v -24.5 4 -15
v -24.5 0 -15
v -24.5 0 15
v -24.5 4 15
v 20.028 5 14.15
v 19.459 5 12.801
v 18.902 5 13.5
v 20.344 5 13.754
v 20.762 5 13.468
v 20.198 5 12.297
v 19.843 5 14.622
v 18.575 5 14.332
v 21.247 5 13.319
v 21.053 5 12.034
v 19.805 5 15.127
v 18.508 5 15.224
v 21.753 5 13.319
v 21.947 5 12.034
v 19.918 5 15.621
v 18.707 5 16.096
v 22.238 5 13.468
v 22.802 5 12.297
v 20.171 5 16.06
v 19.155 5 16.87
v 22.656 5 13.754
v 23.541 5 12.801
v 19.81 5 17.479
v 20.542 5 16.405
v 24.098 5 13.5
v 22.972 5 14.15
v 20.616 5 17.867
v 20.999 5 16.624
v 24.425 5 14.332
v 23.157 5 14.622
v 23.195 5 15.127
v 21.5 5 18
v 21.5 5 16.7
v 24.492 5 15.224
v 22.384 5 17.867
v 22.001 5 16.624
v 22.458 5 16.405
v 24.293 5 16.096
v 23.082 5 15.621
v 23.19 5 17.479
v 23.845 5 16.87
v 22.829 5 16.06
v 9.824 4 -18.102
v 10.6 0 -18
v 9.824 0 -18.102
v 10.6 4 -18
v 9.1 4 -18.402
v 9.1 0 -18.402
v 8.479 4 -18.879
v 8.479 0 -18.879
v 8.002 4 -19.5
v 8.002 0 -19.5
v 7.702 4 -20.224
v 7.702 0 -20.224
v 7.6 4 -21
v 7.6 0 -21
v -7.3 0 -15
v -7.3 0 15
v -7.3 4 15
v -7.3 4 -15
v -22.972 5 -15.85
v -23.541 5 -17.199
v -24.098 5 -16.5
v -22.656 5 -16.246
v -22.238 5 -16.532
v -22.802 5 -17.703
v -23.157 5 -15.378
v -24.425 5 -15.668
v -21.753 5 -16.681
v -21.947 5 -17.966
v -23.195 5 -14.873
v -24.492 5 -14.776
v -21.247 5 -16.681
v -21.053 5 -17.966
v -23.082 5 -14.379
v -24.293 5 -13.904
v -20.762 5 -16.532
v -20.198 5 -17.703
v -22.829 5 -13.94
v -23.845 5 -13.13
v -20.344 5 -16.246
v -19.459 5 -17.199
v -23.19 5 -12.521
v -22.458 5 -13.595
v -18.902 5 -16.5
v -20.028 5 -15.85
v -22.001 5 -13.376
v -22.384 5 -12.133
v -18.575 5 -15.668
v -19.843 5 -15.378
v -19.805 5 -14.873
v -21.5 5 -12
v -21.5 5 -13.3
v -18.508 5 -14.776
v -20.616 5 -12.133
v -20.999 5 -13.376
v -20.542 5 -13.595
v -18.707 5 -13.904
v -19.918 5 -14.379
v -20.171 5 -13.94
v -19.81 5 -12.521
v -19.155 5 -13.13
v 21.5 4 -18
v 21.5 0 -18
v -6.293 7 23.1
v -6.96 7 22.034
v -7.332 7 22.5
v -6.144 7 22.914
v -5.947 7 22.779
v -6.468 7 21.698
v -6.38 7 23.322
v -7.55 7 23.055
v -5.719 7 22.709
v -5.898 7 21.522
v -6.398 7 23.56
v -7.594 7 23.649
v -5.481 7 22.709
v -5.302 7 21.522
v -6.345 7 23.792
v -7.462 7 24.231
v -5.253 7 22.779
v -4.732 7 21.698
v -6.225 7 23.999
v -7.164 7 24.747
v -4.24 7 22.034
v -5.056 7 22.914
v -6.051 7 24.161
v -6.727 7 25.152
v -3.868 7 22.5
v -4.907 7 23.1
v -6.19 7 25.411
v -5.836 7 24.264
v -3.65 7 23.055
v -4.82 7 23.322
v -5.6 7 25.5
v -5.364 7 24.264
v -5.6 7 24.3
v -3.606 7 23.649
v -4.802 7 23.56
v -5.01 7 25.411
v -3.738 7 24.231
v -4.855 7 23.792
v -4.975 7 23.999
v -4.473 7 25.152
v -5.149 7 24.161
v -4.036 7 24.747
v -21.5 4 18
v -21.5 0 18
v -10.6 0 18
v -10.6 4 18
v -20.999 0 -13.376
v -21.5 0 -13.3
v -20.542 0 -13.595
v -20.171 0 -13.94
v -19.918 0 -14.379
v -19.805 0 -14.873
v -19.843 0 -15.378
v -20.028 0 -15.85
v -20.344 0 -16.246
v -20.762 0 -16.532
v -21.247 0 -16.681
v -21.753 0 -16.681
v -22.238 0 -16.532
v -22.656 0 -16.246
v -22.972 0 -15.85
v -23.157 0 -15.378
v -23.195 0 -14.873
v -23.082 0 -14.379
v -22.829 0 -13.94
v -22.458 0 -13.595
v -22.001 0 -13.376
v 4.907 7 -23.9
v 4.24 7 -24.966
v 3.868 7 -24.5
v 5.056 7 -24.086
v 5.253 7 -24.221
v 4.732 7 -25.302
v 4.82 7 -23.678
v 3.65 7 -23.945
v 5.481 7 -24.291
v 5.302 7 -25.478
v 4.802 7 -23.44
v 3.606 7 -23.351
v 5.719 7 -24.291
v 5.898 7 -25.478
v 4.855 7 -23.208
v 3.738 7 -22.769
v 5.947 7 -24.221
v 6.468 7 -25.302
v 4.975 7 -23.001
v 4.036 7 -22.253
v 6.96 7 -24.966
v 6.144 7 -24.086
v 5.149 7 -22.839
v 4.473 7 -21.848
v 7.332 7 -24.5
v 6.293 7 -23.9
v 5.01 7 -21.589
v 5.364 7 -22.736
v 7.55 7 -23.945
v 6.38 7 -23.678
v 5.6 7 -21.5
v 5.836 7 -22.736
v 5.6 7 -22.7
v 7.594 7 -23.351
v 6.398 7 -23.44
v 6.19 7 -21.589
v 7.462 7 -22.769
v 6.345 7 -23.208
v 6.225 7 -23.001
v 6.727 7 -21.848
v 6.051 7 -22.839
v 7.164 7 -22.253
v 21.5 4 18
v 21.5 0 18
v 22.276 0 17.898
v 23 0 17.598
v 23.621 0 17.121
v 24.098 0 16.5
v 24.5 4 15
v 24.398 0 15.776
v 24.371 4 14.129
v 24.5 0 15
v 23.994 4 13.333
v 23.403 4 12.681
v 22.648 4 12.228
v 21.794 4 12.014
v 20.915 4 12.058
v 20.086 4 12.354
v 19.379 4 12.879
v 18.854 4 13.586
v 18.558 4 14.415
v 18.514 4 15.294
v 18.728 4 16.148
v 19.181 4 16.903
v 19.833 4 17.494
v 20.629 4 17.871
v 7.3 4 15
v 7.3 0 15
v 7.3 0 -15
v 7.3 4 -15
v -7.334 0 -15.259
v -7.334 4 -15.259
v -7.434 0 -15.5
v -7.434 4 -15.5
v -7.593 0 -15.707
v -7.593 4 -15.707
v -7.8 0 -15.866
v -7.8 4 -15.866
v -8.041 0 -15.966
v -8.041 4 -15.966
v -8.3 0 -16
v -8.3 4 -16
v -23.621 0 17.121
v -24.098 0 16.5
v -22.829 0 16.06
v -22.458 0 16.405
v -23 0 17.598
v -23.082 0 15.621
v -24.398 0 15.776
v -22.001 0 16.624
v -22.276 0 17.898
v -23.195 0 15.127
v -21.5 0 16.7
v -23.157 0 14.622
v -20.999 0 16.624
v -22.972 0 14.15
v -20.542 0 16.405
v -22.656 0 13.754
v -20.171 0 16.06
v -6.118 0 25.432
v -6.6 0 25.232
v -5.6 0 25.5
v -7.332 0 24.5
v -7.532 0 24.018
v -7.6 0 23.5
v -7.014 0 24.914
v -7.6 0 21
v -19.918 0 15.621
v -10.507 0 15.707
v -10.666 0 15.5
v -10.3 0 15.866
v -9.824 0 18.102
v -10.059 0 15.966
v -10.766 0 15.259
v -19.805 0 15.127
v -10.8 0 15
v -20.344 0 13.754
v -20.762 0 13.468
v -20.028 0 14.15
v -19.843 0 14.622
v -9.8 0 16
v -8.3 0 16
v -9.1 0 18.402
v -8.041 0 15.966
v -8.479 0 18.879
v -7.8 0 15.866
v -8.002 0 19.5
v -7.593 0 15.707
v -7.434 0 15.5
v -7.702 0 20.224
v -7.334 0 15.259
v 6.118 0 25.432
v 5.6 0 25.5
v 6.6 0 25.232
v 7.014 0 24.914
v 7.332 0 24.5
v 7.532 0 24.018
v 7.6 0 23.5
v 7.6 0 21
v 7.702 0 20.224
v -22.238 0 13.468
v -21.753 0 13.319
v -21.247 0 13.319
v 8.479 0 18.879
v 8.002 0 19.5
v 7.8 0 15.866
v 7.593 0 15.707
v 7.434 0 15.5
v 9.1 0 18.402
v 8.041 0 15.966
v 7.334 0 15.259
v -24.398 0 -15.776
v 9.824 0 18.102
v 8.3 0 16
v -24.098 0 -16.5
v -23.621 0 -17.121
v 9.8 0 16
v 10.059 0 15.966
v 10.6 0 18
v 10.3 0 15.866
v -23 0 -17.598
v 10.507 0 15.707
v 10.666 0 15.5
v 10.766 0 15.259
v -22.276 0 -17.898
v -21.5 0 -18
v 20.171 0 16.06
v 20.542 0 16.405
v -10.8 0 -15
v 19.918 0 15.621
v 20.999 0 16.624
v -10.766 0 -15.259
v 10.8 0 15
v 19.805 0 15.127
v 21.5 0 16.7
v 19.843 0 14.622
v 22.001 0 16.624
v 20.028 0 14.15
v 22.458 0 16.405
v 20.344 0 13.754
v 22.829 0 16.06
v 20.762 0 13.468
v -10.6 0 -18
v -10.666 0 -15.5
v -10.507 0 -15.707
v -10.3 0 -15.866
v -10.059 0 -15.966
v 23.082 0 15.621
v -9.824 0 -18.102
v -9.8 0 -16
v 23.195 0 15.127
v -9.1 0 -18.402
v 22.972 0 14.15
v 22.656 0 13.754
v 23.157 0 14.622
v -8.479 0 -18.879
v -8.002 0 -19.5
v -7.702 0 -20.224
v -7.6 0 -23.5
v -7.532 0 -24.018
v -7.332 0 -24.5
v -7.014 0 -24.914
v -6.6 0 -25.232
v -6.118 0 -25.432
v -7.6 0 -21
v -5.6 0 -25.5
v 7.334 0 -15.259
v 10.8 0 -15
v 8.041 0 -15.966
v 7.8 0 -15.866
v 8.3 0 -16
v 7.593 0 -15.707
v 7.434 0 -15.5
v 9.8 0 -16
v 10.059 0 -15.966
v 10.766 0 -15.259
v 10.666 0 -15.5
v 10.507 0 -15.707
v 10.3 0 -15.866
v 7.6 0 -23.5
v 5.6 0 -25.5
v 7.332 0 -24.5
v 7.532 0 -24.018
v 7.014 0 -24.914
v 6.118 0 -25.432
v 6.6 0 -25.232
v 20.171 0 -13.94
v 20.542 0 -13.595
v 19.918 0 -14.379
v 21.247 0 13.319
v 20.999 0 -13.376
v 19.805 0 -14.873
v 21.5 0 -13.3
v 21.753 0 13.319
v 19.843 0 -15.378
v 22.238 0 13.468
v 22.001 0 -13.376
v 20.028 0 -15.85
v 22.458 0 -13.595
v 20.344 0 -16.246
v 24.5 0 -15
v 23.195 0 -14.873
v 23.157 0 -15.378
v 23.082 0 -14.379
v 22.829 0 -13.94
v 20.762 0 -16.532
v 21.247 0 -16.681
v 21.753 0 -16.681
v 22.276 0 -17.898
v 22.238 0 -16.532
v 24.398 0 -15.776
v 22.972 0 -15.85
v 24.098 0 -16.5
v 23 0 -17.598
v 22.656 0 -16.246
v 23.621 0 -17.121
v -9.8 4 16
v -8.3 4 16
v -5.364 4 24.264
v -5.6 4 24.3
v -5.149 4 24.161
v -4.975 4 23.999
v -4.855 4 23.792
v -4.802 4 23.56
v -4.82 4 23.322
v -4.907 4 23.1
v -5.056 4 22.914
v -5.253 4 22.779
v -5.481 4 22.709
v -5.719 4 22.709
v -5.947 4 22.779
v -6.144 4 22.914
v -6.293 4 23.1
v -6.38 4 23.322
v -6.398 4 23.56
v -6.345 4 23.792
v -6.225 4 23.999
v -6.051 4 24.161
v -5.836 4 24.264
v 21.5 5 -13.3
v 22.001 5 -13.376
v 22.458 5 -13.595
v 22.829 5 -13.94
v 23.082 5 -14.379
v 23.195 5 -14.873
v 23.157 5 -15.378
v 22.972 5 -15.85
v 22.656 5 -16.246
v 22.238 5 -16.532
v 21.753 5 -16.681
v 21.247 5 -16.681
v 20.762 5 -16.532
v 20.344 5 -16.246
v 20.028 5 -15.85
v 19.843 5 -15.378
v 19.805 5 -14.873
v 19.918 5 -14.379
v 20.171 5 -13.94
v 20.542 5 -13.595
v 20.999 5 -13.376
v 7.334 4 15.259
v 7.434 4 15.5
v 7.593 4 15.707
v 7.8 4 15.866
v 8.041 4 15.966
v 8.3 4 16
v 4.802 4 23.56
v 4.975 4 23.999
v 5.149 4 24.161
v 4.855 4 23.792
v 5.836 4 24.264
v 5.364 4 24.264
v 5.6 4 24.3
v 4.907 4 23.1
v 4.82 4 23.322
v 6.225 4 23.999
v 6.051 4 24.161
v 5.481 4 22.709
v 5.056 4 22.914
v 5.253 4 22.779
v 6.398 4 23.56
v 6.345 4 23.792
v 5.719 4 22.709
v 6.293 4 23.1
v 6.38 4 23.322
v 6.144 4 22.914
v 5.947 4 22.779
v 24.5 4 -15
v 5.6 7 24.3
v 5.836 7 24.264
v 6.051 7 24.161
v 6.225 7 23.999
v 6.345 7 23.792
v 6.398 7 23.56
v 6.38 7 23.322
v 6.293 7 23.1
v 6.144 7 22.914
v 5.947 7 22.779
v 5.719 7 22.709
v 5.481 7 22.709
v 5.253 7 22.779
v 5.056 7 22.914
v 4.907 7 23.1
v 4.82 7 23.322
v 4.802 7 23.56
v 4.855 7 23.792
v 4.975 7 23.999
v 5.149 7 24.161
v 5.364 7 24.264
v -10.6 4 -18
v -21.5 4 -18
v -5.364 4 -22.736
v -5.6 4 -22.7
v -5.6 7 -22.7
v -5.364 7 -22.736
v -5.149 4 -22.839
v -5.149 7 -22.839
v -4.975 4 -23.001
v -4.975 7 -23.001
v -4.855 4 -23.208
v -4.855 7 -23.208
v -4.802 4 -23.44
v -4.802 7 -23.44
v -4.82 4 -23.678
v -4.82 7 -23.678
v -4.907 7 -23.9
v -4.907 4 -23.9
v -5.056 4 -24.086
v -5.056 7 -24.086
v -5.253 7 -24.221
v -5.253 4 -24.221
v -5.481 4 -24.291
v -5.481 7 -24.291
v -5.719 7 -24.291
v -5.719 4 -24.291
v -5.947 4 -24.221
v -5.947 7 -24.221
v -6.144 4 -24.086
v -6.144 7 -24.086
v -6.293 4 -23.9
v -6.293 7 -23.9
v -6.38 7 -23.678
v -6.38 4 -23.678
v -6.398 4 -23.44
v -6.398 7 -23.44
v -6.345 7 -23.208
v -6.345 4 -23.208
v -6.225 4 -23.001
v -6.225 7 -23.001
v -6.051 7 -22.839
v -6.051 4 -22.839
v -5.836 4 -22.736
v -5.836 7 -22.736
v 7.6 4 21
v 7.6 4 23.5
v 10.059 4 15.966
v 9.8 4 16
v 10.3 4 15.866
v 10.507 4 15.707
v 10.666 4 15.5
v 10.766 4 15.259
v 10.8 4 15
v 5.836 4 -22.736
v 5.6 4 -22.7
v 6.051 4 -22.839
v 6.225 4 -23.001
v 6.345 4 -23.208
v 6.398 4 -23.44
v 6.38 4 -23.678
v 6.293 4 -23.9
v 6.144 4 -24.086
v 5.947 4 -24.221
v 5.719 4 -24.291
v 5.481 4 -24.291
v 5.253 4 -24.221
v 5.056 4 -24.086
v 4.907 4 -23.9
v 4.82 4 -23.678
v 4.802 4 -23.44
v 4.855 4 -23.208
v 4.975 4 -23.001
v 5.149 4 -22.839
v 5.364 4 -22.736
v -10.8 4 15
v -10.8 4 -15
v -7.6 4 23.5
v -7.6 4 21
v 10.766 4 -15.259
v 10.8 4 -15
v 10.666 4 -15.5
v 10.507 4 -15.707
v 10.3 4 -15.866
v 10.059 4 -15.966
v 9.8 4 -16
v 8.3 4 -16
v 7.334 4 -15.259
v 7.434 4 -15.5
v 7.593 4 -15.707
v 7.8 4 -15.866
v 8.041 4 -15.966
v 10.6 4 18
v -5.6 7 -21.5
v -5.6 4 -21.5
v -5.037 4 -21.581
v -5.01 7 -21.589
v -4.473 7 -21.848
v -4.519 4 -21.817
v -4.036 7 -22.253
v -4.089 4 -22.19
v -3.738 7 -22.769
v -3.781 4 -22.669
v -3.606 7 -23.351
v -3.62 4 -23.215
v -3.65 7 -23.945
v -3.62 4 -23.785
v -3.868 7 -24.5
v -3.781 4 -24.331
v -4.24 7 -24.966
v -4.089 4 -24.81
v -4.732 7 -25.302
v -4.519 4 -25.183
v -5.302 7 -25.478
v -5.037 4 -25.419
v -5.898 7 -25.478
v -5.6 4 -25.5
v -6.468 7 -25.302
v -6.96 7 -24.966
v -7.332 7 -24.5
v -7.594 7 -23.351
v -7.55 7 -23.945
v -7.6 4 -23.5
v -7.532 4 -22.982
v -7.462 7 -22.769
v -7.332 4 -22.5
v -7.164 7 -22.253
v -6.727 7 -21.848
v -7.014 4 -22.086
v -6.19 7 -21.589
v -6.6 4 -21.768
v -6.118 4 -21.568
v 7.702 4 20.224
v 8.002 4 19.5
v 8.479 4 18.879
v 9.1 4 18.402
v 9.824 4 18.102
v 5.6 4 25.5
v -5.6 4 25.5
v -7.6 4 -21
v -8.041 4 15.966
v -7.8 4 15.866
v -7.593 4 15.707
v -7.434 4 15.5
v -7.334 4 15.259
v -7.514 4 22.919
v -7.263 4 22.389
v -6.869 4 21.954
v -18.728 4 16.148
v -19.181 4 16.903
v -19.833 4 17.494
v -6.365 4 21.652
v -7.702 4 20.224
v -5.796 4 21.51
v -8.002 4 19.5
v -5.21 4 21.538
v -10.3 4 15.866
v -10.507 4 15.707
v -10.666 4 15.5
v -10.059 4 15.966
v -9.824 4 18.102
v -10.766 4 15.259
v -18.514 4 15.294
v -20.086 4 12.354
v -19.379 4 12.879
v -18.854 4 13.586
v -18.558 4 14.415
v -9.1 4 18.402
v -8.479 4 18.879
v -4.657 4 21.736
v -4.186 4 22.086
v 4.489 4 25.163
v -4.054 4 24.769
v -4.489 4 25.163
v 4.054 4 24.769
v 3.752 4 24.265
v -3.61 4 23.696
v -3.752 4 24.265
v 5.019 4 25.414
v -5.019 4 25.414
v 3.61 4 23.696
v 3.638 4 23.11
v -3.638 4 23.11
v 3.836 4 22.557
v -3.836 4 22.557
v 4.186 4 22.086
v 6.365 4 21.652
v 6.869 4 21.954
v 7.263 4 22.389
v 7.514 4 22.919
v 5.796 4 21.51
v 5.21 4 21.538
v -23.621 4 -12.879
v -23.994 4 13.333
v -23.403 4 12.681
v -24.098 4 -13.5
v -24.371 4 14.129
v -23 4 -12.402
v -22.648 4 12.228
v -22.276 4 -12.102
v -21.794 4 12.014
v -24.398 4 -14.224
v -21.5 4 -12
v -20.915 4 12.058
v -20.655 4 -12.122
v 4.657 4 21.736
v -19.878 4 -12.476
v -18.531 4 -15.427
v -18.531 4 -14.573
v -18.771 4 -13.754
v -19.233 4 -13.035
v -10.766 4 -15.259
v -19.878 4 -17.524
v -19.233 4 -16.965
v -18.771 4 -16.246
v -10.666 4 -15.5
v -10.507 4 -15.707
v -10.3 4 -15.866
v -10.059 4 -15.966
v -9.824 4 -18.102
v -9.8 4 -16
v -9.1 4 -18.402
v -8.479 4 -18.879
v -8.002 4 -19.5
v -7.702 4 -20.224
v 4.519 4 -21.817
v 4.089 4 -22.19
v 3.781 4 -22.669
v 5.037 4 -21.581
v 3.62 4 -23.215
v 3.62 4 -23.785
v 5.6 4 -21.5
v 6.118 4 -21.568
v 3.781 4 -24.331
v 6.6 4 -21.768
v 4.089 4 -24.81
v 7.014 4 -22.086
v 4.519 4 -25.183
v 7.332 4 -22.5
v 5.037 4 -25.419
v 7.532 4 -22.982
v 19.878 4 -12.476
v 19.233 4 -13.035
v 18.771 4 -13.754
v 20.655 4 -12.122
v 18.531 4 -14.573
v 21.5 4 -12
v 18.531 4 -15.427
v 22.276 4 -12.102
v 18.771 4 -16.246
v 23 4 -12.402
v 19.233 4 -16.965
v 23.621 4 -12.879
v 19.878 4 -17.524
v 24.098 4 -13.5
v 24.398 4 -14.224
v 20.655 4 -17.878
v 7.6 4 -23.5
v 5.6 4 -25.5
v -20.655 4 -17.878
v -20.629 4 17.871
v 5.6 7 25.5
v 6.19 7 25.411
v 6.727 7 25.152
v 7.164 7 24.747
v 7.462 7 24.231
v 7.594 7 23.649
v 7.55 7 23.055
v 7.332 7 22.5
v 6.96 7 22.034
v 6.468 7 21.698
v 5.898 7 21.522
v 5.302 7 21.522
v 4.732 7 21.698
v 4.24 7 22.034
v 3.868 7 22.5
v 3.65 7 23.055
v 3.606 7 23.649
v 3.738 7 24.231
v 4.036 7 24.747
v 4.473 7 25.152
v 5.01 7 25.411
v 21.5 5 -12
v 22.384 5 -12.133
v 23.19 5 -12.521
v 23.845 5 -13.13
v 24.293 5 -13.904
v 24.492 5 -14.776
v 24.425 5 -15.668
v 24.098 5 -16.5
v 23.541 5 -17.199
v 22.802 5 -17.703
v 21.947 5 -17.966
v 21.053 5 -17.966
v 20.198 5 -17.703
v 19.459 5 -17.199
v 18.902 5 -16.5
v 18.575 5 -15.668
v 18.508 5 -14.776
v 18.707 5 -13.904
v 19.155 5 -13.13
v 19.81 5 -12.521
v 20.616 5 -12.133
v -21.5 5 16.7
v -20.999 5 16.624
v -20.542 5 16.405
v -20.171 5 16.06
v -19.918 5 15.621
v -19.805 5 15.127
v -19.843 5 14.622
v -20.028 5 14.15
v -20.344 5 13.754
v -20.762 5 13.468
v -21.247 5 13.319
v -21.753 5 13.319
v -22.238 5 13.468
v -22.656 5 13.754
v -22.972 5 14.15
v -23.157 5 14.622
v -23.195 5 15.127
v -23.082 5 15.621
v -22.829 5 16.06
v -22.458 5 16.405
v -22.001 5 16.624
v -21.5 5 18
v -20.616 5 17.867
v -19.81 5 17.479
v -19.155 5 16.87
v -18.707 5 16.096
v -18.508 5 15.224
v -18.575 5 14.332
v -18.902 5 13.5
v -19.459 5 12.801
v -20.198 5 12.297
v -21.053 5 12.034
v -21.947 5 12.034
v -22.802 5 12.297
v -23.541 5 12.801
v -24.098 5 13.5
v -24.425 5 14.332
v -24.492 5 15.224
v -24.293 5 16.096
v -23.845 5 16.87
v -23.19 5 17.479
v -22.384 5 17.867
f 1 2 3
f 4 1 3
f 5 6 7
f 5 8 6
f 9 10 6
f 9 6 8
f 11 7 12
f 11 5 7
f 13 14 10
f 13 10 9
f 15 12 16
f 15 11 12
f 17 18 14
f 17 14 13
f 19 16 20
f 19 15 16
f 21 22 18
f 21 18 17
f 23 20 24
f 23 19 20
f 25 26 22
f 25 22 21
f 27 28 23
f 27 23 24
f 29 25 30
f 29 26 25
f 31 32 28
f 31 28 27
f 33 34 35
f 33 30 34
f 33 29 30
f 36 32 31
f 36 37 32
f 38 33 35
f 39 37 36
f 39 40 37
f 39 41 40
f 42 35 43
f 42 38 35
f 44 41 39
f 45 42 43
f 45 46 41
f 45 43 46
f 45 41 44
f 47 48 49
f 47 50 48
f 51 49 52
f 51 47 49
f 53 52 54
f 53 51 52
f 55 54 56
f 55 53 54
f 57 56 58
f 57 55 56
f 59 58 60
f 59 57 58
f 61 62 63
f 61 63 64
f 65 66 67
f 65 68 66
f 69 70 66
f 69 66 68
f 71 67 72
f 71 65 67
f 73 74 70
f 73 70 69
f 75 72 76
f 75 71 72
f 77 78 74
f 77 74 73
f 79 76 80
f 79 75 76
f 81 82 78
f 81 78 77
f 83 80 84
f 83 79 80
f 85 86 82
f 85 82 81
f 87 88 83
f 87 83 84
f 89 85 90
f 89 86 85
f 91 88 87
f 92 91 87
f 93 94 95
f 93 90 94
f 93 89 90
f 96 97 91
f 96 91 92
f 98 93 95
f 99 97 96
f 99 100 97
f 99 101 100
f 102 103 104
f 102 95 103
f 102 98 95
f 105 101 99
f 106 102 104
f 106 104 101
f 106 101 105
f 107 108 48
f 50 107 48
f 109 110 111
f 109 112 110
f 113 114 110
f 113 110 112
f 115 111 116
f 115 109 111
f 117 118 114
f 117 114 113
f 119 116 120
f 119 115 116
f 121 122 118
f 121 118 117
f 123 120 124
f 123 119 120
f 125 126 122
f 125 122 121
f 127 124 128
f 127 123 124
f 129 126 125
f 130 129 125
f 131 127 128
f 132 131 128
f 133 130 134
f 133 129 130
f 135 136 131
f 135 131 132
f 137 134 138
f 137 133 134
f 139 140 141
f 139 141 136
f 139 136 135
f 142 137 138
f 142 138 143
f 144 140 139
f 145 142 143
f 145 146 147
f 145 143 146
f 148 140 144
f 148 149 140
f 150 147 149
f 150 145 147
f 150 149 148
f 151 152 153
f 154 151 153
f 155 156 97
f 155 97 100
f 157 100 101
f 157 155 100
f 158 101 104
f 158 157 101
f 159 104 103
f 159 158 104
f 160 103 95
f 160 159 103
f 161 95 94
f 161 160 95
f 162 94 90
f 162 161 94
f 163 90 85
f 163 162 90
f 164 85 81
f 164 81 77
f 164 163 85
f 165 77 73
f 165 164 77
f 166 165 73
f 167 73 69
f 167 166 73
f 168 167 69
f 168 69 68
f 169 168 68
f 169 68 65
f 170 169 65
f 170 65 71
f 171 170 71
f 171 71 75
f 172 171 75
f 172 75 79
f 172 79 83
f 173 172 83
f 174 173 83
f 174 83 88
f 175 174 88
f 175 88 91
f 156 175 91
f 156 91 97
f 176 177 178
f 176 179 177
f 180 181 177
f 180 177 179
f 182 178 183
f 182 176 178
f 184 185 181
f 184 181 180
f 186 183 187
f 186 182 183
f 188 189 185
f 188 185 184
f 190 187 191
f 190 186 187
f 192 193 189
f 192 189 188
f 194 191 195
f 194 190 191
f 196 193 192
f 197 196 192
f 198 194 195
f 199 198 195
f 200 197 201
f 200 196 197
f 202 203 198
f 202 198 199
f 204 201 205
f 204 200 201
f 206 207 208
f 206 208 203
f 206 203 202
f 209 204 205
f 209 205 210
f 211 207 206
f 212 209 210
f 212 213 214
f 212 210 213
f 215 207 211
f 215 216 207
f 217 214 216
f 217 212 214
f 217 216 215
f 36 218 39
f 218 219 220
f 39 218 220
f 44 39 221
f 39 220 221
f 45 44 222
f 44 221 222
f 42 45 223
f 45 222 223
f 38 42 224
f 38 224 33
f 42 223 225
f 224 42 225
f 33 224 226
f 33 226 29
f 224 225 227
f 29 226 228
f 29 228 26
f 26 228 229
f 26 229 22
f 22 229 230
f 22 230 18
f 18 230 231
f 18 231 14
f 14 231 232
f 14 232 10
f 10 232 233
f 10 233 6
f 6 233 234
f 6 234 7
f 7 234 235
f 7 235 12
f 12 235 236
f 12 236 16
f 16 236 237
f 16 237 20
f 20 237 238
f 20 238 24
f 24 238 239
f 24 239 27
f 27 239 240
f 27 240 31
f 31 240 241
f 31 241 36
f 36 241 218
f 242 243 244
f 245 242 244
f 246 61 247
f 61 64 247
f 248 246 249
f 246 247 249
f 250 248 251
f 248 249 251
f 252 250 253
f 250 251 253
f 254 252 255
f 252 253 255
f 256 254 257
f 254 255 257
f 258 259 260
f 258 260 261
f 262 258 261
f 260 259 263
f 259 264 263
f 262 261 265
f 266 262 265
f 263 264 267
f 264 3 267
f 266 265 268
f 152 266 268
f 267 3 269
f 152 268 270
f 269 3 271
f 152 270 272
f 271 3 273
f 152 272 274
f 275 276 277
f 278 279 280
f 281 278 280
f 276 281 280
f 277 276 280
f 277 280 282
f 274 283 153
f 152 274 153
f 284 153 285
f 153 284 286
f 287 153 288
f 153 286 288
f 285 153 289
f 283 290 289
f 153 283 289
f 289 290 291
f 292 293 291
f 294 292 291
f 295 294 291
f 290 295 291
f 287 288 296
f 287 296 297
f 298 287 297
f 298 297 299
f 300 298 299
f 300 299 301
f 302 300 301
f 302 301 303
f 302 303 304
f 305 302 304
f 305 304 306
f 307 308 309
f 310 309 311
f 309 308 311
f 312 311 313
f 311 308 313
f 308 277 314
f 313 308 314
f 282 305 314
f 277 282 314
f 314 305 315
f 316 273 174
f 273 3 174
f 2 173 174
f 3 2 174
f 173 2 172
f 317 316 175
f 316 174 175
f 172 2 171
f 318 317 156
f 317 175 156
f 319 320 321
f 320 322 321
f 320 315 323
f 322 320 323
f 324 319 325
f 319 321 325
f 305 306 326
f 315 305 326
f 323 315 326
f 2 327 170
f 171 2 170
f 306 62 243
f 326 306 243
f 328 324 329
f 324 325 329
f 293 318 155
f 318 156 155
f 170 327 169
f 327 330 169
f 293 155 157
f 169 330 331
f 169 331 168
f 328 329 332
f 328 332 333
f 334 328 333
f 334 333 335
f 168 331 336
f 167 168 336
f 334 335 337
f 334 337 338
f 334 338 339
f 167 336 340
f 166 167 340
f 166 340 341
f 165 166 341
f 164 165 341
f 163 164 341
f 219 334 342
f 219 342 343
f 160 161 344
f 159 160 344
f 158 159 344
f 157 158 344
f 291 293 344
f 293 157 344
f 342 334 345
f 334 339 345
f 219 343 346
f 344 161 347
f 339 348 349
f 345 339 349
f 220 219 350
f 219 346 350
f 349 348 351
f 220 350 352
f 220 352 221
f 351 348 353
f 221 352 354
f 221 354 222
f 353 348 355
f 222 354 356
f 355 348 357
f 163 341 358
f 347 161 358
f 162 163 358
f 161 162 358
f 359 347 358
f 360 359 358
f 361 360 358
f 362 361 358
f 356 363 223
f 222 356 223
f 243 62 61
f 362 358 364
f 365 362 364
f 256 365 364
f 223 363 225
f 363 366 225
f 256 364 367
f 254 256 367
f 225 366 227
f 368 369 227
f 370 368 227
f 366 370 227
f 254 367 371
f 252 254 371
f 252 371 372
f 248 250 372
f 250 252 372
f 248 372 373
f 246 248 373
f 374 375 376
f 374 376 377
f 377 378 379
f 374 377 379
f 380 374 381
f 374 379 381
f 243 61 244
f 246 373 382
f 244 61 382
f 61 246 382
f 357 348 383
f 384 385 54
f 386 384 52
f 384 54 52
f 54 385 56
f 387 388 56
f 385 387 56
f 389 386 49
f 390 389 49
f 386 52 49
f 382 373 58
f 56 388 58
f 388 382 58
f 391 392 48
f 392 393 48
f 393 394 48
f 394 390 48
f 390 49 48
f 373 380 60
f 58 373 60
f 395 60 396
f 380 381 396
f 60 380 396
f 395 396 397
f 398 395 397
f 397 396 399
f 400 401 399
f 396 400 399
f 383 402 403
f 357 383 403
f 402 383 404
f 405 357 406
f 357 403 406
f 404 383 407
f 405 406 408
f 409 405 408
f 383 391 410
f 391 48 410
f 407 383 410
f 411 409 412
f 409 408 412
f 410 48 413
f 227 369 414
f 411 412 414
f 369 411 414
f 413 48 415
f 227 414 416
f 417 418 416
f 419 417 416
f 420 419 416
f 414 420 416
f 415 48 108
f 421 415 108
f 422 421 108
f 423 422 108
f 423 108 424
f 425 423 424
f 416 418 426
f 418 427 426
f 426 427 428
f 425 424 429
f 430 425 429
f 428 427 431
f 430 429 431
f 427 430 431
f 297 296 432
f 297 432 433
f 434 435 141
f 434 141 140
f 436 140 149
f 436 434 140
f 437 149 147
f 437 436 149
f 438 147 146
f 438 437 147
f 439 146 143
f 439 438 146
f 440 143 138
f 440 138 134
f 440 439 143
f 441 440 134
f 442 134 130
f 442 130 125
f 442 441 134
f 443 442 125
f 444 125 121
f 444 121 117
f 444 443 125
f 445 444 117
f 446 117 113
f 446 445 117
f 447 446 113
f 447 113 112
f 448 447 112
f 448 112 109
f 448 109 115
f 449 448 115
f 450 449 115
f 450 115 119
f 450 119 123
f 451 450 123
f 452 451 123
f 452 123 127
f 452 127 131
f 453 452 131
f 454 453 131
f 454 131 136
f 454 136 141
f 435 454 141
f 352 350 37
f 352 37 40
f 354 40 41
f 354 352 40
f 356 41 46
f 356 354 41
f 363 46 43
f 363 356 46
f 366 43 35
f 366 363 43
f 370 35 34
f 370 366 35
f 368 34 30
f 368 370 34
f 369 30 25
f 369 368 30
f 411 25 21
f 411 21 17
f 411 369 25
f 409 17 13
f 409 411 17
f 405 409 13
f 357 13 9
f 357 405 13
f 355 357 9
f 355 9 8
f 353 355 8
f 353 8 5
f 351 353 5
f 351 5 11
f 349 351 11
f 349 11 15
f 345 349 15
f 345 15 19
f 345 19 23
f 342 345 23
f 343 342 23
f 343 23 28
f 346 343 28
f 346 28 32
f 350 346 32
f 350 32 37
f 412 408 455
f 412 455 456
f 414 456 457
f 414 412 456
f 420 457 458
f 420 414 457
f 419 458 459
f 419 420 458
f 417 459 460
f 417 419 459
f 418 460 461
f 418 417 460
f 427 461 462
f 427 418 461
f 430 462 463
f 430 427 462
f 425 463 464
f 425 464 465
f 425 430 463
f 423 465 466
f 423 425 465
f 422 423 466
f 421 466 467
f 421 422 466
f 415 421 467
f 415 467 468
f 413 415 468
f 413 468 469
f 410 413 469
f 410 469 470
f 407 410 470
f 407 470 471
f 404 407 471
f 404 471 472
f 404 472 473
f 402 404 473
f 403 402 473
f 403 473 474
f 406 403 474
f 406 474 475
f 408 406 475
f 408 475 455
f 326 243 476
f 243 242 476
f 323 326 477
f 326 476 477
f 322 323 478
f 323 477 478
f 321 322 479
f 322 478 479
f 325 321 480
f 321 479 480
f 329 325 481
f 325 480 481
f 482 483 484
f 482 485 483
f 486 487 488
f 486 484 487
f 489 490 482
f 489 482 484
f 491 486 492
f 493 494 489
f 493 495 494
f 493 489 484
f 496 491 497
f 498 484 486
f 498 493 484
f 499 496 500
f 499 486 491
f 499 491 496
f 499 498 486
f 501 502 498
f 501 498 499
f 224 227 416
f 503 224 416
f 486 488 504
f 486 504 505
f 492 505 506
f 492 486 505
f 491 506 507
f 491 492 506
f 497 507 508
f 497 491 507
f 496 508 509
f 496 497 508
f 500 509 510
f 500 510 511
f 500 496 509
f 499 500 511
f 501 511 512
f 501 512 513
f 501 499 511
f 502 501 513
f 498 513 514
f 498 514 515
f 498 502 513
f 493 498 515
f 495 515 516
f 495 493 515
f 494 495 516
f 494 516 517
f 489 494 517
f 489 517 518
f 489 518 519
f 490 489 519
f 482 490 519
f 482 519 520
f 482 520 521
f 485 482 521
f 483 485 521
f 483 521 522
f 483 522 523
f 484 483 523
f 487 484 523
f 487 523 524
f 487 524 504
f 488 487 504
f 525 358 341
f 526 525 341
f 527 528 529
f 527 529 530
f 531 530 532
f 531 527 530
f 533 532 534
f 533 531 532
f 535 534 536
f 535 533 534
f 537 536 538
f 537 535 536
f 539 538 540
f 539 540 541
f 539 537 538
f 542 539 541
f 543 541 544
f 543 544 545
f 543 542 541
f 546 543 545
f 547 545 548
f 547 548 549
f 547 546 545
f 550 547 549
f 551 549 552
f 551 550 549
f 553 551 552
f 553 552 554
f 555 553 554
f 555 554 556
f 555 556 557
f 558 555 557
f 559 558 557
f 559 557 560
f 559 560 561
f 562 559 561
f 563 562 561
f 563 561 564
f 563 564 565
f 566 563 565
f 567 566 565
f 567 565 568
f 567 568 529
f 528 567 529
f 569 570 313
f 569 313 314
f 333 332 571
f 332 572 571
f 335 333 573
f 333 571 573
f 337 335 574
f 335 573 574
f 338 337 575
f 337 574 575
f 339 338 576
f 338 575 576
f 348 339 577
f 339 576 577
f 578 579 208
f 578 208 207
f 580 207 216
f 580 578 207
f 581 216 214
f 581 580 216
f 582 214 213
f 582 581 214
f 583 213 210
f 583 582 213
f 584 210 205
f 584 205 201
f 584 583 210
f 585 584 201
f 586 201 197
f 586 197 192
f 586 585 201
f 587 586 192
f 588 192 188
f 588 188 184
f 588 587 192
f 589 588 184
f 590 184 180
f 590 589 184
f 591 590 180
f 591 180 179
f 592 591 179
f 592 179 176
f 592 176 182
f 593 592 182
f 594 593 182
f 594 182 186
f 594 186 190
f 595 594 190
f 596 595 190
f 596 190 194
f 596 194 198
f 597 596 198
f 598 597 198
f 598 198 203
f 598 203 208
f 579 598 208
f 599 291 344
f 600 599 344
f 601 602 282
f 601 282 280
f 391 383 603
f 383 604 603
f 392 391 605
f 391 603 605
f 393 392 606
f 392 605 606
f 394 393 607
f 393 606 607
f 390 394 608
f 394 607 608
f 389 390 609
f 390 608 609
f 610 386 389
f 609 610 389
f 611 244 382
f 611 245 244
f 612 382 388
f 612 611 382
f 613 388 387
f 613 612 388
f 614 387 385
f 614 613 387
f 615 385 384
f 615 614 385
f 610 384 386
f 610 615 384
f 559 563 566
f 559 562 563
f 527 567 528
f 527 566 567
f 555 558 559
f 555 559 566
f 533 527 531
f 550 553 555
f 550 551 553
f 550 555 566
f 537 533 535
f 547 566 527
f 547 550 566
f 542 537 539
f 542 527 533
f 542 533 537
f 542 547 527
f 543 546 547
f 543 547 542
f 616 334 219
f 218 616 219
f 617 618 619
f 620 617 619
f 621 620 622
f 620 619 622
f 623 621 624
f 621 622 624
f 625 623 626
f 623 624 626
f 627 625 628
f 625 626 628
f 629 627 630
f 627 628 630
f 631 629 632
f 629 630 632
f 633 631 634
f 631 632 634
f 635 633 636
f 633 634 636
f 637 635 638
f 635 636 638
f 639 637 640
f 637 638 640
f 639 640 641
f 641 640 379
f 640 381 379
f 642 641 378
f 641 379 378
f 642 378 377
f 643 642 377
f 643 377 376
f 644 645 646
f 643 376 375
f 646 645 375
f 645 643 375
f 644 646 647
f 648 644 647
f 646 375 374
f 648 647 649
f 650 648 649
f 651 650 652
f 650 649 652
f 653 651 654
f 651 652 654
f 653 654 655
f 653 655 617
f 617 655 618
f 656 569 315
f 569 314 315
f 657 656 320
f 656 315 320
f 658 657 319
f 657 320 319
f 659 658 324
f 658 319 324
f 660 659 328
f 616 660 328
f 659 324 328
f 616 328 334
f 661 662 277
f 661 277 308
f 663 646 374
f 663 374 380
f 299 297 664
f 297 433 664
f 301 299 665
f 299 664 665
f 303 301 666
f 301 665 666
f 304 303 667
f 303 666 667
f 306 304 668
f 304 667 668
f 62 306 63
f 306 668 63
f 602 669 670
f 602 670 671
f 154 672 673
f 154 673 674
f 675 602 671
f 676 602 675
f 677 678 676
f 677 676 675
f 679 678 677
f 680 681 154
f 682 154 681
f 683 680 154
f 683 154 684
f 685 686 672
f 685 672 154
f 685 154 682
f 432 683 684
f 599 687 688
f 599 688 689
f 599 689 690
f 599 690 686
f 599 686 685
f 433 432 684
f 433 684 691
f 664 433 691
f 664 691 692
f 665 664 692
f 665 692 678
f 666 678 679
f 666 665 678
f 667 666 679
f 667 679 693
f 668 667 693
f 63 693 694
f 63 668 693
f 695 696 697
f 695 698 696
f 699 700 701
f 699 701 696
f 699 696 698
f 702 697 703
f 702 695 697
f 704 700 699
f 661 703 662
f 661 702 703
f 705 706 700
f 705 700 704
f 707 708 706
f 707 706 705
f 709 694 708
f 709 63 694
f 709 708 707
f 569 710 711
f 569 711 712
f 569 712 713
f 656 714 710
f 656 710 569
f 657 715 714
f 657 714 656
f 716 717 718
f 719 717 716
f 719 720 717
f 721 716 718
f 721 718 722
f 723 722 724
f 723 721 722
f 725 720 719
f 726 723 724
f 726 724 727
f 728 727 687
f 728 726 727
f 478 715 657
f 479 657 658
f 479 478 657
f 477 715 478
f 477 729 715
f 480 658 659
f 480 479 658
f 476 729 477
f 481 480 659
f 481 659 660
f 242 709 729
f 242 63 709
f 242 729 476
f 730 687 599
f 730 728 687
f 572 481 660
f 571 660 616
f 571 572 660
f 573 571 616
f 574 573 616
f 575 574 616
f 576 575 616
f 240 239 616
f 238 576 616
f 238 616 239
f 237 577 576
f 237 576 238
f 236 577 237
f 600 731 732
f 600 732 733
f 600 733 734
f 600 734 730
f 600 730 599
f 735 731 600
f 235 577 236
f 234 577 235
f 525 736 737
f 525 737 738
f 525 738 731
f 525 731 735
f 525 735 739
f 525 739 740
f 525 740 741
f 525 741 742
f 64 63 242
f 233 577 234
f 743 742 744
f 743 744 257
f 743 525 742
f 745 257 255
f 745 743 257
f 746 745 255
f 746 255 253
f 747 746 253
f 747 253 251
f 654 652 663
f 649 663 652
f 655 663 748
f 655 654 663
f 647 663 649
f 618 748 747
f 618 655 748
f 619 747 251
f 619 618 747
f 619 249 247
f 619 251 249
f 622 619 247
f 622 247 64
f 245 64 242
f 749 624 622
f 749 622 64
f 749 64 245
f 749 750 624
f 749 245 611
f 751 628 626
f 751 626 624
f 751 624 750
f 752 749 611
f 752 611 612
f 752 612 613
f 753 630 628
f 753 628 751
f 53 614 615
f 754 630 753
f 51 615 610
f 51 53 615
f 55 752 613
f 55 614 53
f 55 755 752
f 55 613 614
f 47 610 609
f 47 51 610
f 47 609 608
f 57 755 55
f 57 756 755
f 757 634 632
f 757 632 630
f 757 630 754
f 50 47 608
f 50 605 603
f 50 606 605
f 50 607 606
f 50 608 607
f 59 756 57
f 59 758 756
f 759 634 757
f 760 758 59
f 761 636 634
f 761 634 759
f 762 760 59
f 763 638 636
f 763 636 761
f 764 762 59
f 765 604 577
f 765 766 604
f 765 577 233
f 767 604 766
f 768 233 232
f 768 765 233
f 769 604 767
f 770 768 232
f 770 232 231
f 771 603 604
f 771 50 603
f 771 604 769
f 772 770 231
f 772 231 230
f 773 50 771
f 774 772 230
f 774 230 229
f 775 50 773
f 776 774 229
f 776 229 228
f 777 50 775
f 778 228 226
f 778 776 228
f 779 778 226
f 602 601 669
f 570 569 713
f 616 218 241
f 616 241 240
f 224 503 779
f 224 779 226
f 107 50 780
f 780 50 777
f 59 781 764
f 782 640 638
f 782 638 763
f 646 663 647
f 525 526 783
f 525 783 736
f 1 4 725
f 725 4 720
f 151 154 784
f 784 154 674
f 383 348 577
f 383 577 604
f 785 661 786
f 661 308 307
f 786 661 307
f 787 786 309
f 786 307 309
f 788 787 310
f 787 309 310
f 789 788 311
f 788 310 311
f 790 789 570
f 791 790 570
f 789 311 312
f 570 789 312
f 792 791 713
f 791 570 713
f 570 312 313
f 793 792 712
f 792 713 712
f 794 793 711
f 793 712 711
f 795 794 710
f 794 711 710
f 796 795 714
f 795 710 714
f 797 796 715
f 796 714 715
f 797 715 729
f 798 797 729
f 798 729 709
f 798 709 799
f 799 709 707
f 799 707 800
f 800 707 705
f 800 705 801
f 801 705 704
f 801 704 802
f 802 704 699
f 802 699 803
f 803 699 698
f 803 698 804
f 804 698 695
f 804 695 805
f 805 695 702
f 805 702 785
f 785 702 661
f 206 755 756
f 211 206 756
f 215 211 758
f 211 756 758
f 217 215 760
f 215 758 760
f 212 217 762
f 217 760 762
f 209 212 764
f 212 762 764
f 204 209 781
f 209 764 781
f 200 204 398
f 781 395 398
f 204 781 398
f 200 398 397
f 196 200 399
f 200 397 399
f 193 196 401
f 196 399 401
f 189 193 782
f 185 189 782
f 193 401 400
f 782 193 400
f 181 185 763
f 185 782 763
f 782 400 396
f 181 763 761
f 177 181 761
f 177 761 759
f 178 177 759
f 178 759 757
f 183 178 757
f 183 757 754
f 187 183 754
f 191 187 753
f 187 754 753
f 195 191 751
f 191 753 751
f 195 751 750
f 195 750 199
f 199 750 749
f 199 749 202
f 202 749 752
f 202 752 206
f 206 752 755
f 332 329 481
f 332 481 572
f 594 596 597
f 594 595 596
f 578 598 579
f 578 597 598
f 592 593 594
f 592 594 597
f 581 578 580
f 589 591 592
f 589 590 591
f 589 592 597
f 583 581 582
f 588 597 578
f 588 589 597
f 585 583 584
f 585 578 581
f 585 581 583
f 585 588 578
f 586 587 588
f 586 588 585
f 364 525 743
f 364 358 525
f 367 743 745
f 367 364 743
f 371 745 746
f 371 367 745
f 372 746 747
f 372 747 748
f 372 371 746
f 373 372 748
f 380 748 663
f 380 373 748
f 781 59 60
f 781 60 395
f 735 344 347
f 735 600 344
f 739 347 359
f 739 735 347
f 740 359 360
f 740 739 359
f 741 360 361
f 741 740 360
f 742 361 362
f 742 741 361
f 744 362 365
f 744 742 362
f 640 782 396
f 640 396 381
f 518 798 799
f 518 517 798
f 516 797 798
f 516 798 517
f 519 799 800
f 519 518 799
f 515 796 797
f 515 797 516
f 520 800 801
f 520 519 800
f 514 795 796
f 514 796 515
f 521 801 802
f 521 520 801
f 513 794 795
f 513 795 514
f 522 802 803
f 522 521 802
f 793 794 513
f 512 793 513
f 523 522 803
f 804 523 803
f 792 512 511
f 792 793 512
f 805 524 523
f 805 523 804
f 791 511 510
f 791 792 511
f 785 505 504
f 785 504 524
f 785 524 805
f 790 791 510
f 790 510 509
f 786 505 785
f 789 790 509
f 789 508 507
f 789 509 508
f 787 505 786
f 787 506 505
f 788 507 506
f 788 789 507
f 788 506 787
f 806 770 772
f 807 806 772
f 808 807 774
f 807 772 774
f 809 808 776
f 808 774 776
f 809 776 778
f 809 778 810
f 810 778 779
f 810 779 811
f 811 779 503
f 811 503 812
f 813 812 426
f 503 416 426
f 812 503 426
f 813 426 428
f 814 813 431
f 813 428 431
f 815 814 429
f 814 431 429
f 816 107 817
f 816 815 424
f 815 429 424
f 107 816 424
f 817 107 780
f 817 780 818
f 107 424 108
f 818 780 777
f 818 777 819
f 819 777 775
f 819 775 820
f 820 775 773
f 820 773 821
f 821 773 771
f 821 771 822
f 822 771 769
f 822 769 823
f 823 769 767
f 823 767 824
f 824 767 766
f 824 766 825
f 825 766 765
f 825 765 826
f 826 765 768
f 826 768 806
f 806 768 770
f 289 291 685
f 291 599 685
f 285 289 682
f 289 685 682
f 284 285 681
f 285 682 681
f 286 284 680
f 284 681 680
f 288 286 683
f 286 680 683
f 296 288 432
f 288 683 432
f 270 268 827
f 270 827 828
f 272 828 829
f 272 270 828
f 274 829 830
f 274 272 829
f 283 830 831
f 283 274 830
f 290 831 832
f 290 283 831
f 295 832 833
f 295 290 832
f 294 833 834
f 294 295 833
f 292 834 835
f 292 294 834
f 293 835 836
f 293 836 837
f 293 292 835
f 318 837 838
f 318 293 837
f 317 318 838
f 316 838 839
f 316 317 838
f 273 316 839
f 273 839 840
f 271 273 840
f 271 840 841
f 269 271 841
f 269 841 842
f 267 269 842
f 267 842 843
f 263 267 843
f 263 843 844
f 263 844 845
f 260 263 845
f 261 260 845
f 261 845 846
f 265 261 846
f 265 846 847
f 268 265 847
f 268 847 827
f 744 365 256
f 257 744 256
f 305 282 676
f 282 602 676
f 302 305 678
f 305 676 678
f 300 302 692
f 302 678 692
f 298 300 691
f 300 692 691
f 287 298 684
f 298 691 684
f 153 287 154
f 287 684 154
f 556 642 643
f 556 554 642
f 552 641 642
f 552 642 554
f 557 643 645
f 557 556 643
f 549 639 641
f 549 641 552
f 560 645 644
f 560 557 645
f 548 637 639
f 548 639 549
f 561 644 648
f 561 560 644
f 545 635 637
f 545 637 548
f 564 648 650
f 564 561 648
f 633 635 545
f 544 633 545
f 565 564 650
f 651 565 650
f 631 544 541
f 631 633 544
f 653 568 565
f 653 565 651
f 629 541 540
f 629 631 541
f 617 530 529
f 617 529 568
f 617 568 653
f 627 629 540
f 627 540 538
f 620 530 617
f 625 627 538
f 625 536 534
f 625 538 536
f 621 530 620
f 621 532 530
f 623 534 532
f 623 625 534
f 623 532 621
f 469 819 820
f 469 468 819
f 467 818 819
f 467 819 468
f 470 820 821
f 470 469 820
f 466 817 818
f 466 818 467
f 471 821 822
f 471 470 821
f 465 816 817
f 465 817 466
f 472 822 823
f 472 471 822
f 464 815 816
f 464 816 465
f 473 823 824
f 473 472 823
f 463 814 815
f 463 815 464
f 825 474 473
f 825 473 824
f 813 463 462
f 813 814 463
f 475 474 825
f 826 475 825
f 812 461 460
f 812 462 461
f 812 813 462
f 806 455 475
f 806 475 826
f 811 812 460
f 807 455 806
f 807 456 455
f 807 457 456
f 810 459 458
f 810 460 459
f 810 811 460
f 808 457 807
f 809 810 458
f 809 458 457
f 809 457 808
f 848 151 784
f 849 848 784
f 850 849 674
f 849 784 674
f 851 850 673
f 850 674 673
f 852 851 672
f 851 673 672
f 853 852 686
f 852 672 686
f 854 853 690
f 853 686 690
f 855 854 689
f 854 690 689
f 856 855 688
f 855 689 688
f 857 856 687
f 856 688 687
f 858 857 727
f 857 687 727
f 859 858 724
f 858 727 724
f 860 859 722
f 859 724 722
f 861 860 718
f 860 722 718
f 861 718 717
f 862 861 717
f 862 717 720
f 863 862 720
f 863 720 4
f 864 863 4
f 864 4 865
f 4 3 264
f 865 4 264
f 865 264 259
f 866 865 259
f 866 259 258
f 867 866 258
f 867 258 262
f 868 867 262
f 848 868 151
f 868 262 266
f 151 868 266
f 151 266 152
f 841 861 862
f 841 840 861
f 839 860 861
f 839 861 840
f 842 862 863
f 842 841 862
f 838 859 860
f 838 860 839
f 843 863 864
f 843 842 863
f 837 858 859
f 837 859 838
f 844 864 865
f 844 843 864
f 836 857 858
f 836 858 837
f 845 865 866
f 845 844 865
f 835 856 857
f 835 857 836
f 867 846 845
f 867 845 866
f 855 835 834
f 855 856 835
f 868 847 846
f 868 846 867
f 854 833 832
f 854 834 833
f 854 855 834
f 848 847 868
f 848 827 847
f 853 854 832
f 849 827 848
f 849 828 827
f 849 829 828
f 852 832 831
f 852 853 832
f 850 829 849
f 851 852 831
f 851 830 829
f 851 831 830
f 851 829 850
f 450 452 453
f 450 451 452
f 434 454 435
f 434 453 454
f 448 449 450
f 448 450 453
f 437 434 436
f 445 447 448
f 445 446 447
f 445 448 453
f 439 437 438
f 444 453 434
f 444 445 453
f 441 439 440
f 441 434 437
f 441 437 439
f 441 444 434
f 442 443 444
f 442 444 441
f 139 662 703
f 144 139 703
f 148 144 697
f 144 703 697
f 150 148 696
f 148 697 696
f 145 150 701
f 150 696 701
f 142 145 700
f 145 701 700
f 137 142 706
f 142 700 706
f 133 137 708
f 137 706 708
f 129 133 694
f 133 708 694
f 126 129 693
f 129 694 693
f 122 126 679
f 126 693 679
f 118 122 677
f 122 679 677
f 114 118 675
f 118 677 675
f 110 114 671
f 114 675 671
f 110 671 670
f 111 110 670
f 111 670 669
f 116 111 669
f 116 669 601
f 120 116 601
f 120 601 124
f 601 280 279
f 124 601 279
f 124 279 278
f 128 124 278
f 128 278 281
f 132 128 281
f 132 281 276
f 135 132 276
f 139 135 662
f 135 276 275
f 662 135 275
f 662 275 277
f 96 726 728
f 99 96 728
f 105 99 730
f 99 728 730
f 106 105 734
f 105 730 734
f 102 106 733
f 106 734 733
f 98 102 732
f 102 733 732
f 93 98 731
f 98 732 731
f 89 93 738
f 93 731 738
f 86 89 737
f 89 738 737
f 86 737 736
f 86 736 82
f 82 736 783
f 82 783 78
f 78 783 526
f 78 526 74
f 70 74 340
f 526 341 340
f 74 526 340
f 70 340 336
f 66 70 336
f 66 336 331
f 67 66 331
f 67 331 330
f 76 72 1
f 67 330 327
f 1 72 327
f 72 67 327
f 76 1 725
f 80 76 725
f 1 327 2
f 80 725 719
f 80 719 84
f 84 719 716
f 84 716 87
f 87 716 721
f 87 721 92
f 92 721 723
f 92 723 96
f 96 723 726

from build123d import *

# Parameters (mm, degrees)
SKETCH1_R               = 3
SKETCH1_R_2             = 1.7
BOSS_EXTRUDE1_DEPTH     = 5
BOSS_EXTRUDE1_2_DEPTH   = 5
BOSS_EXTRUDE1_3_DEPTH   = 5
BOSS_EXTRUDE1_4_DEPTH   = 5
BOSS_EXTRUDE2_DEPTH     = 4
CUT_EXTRUDE1_DEPTH      = 31.809901006
CUT_EXTRUDE1_DEPTH_BACK = 31.809901006
SKETCH1_2_R             = 1.7
SKETCH3_R               = 2
SKETCH3_R_2             = 0.8
BOSS_EXTRUDE3_DEPTH     = 7
BOSS_EXTRUDE3_2_DEPTH   = 7
BOSS_EXTRUDE3_3_DEPTH   = 7
BOSS_EXTRUDE3_4_DEPTH   = 7
BOSS_EXTRUDE4_DEPTH     = 4
CUT_EXTRUDE2_DEPTH      = 36.587919299
CUT_EXTRUDE2_DEPTH_BACK = 36.587919299
SKETCH6_W               = 3.5
SKETCH6_H               = 32
FILLET1_R               = 1
FILLET2_R               = 3


with BuildPart() as part:
    # Sketch1 → Boss-Extrude1 (new body)
    with BuildSketch(Plane(origin=(0, 0, 0), x_dir=(1, 0, 0), z_dir=(0, 1, 0))):
        with Locations(Location((-21.5, 15, 0), (0, 0, 270))):
            Circle(SKETCH1_R)
        with Locations(Location((-21.5, 15, 0), (0, 0, 270))):
            Circle(SKETCH1_R_2, mode=Mode.SUBTRACT)
    extrude(amount=BOSS_EXTRUDE1_DEPTH)



with BuildPart() as body_2:
    # Sketch1 → Boss-Extrude1 2 (new body)
    with BuildSketch(Plane(origin=(0, 0, 0), x_dir=(1, 0, 0), z_dir=(0, 1, 0))):
        with Locations(Location((-21.5, -15, 0), (0, 0, 270))):
            Circle(SKETCH1_R)
        with Locations(Location((-21.5, -15, 0), (0, 0, 270))):
            Circle(SKETCH1_R_2, mode=Mode.SUBTRACT)
    extrude(amount=BOSS_EXTRUDE1_2_DEPTH)


with BuildPart() as body_3:
    # Sketch1 → Boss-Extrude1 3 (new body)
    with BuildSketch(Plane(origin=(0, 0, 0), x_dir=(1, 0, 0), z_dir=(0, 1, 0))):
        with Locations(Location((21.5, -15, 0), (0, 0, 270))):
            Circle(SKETCH1_R)
        with Locations(Location((21.5, -15, 0), (0, 0, 270))):
            Circle(SKETCH1_R_2, mode=Mode.SUBTRACT)
    extrude(amount=BOSS_EXTRUDE1_3_DEPTH)


with BuildPart() as body_4:
    # Sketch1 → Boss-Extrude1 4 (new body)
    with BuildSketch(Plane(origin=(0, 0, 0), x_dir=(1, 0, 0), z_dir=(0, 1, 0))):
        with Locations(Location((21.5, 15, 0), (0, 0, 270))):
            Circle(SKETCH1_R)
        with Locations(Location((21.5, 15, 0), (0, 0, 270))):
            Circle(SKETCH1_R_2, mode=Mode.SUBTRACT)
    extrude(amount=BOSS_EXTRUDE1_4_DEPTH)


with BuildPart() as part_1:
    add(part.part)

    add(body_2.part)  # Boss-Extrude2 merges body 2

    add(body_3.part)  # Boss-Extrude2 merges body 3

    add(body_4.part)  # Boss-Extrude2 merges body 4
    # Sketch2 → Boss-Extrude2 (add)
    with BuildSketch(Plane(origin=(0, 0, 0), x_dir=(1, 0, 0), z_dir=(0, 1, 0))):
        with BuildLine():
            Line((-21.5, -18), (21.5, -18))
            ThreePointArc((21.5, -18), (23.621320344, -17.121320344), (24.5, -15))
            Line((24.5, -15), (24.5, 15))
            ThreePointArc((24.5, 15), (23.621320344, 17.121320344), (21.5, 18))
            Line((21.5, 18), (-21.5, 18))
            ThreePointArc((-21.5, 18), (-23.621320344, 17.121320344), (-24.5, 15))
            Line((-24.5, 15), (-24.5, -15))
            ThreePointArc((-24.5, -15), (-23.621320344, -17.121320344), (-21.5, -18))
        make_face()
    extrude(amount=BOSS_EXTRUDE2_DEPTH)

    # Sketch1<2> → Cut-Extrude1 (cut, two sides: drawn at the far end of the back side and taken through both)
    with BuildSketch(Plane(origin=(0, 0, 0), x_dir=(1, 0, 0), z_dir=(0, 1, 0)).offset(-CUT_EXTRUDE1_DEPTH_BACK)):
        with Locations(Location((-21.5, -15, 0), (0, 0, 270))):
            Circle(SKETCH1_2_R)
        with Locations(Location((-21.5, 15, 0), (0, 0, 270))):
            Circle(SKETCH1_2_R)
        with Locations(Location((21.5, 15, 0), (0, 0, 270))):
            Circle(SKETCH1_2_R)
        with Locations(Location((21.5, -15, 0), (0, 0, 270))):
            Circle(SKETCH1_2_R)
    extrude(amount=CUT_EXTRUDE1_DEPTH + CUT_EXTRUDE1_DEPTH_BACK, mode=Mode.SUBTRACT)



with BuildPart() as body_2_2:
    # Sketch3 → Boss-Extrude3 (new body)
    with BuildSketch(Plane(origin=(0, 0, 0), x_dir=(1, 0, 0), z_dir=(0, 1, 0))):
        with Locations(Location((-5.6, 23.5, 0), (0, 0, 270))):
            Circle(SKETCH3_R)
        with Locations(Location((-5.6, 23.5, 0), (0, 0, 270))):
            Circle(SKETCH3_R_2, mode=Mode.SUBTRACT)
    extrude(amount=BOSS_EXTRUDE3_DEPTH)


with BuildPart() as body_3_2:
    # Sketch3 → Boss-Extrude3 2 (new body)
    with BuildSketch(Plane(origin=(0, 0, 0), x_dir=(1, 0, 0), z_dir=(0, 1, 0))):
        with Locations(Location((5.6, 23.5, 0), (0, 0, 270))):
            Circle(SKETCH3_R)
        with Locations(Location((5.6, 23.5, 0), (0, 0, 270))):
            Circle(SKETCH3_R_2, mode=Mode.SUBTRACT)
    extrude(amount=BOSS_EXTRUDE3_2_DEPTH)


with BuildPart() as body_4_2:
    # Sketch3 → Boss-Extrude3 3 (new body)
    with BuildSketch(Plane(origin=(0, 0, 0), x_dir=(1, 0, 0), z_dir=(0, 1, 0))):
        with Locations(Location((-5.6, -23.5, 0), (0, 0, 270))):
            Circle(SKETCH3_R)
        with Locations(Location((-5.6, -23.5, 0), (0, 0, 270))):
            Circle(SKETCH3_R_2, mode=Mode.SUBTRACT)
    extrude(amount=BOSS_EXTRUDE3_3_DEPTH)


with BuildPart() as body_5:
    # Sketch3 → Boss-Extrude3 4 (new body)
    with BuildSketch(Plane(origin=(0, 0, 0), x_dir=(1, 0, 0), z_dir=(0, 1, 0))):
        with Locations(Location((5.6, -23.5, 0), (0, 0, 270))):
            Circle(SKETCH3_R)
        with Locations(Location((5.6, -23.5, 0), (0, 0, 270))):
            Circle(SKETCH3_R_2, mode=Mode.SUBTRACT)
    extrude(amount=BOSS_EXTRUDE3_4_DEPTH)


with BuildPart() as part_2:
    add(part_1.part)

    add(body_2_2.part)  # Boss-Extrude4 merges body 2 2

    add(body_3_2.part)  # Boss-Extrude4 merges body 3 2

    add(body_4_2.part)  # Boss-Extrude4 merges body 4 2

    add(body_5.part)  # Boss-Extrude4 merges body 5
    # Sketch4 → Boss-Extrude4 (add)
    with BuildSketch(Plane(origin=(0, 4, 0), x_dir=(1, 0, 0), z_dir=(0, 1, 0))):
        with BuildLine():
            Line((-5.6, -25.5), (5.6, -25.5))
            ThreePointArc((5.6, -25.5), (7.014213562, -24.914213562), (7.6, -23.5))
            Line((7.6, -23.5), (7.6, 23.5))
            ThreePointArc((7.6, 23.5), (7.014213562, 24.914213562), (5.6, 25.5))
            Line((5.6, 25.5), (-5.6, 25.5))
            ThreePointArc((-5.6, 25.5), (-7.014213562, 24.914213562), (-7.6, 23.5))
            Line((-7.6, 23.5), (-7.6, -23.5))
            ThreePointArc((-7.6, -23.5), (-7.014213562, -24.914213562), (-5.6, -25.5))
        make_face()
    extrude(amount=-BOSS_EXTRUDE4_DEPTH)

    # Sketch6 → Cut-Extrude2 (cut, two sides: drawn at the far end of the back side and taken through both)
    with BuildSketch(Plane(origin=(0, 4, 0), x_dir=(1, 0, 0), z_dir=(0, 1, 0)).offset(-CUT_EXTRUDE2_DEPTH_BACK)):
        with Locations((-9.05, 0)):
            Rectangle(SKETCH6_W, SKETCH6_H)
        with Locations((9.05, 0)):
            Rectangle(SKETCH6_W, SKETCH6_H)
    extrude(amount=CUT_EXTRUDE2_DEPTH + CUT_EXTRUDE2_DEPTH_BACK, mode=Mode.SUBTRACT)

    # Fillet1
    fillet1_edges = [part_2.edges().sort_by_distance(p)[0] for p in [
        (-10.8, 2, 16),
        (-10.8, 2, -16),
        (-7.3, 2, -16),
        (-7.3, 2, 16),
        (10.8, 2, -16),
        (10.8, 2, 16),
        (7.3, 2, 16),
        (7.3, 2, -16),
    ]]
    fillet(fillet1_edges, radius=FILLET1_R)

    # Fillet2
    fillet2_edges = [part_2.edges().sort_by_distance(p)[0] for p in [
        (-7.6, 2, 18),
        (-7.6, 2, -18),
        (7.6, 2, 18),
        (7.6, 2, -18),
    ]]
    fillet(fillet2_edges, radius=FILLET2_R)


solid = part_2.part
